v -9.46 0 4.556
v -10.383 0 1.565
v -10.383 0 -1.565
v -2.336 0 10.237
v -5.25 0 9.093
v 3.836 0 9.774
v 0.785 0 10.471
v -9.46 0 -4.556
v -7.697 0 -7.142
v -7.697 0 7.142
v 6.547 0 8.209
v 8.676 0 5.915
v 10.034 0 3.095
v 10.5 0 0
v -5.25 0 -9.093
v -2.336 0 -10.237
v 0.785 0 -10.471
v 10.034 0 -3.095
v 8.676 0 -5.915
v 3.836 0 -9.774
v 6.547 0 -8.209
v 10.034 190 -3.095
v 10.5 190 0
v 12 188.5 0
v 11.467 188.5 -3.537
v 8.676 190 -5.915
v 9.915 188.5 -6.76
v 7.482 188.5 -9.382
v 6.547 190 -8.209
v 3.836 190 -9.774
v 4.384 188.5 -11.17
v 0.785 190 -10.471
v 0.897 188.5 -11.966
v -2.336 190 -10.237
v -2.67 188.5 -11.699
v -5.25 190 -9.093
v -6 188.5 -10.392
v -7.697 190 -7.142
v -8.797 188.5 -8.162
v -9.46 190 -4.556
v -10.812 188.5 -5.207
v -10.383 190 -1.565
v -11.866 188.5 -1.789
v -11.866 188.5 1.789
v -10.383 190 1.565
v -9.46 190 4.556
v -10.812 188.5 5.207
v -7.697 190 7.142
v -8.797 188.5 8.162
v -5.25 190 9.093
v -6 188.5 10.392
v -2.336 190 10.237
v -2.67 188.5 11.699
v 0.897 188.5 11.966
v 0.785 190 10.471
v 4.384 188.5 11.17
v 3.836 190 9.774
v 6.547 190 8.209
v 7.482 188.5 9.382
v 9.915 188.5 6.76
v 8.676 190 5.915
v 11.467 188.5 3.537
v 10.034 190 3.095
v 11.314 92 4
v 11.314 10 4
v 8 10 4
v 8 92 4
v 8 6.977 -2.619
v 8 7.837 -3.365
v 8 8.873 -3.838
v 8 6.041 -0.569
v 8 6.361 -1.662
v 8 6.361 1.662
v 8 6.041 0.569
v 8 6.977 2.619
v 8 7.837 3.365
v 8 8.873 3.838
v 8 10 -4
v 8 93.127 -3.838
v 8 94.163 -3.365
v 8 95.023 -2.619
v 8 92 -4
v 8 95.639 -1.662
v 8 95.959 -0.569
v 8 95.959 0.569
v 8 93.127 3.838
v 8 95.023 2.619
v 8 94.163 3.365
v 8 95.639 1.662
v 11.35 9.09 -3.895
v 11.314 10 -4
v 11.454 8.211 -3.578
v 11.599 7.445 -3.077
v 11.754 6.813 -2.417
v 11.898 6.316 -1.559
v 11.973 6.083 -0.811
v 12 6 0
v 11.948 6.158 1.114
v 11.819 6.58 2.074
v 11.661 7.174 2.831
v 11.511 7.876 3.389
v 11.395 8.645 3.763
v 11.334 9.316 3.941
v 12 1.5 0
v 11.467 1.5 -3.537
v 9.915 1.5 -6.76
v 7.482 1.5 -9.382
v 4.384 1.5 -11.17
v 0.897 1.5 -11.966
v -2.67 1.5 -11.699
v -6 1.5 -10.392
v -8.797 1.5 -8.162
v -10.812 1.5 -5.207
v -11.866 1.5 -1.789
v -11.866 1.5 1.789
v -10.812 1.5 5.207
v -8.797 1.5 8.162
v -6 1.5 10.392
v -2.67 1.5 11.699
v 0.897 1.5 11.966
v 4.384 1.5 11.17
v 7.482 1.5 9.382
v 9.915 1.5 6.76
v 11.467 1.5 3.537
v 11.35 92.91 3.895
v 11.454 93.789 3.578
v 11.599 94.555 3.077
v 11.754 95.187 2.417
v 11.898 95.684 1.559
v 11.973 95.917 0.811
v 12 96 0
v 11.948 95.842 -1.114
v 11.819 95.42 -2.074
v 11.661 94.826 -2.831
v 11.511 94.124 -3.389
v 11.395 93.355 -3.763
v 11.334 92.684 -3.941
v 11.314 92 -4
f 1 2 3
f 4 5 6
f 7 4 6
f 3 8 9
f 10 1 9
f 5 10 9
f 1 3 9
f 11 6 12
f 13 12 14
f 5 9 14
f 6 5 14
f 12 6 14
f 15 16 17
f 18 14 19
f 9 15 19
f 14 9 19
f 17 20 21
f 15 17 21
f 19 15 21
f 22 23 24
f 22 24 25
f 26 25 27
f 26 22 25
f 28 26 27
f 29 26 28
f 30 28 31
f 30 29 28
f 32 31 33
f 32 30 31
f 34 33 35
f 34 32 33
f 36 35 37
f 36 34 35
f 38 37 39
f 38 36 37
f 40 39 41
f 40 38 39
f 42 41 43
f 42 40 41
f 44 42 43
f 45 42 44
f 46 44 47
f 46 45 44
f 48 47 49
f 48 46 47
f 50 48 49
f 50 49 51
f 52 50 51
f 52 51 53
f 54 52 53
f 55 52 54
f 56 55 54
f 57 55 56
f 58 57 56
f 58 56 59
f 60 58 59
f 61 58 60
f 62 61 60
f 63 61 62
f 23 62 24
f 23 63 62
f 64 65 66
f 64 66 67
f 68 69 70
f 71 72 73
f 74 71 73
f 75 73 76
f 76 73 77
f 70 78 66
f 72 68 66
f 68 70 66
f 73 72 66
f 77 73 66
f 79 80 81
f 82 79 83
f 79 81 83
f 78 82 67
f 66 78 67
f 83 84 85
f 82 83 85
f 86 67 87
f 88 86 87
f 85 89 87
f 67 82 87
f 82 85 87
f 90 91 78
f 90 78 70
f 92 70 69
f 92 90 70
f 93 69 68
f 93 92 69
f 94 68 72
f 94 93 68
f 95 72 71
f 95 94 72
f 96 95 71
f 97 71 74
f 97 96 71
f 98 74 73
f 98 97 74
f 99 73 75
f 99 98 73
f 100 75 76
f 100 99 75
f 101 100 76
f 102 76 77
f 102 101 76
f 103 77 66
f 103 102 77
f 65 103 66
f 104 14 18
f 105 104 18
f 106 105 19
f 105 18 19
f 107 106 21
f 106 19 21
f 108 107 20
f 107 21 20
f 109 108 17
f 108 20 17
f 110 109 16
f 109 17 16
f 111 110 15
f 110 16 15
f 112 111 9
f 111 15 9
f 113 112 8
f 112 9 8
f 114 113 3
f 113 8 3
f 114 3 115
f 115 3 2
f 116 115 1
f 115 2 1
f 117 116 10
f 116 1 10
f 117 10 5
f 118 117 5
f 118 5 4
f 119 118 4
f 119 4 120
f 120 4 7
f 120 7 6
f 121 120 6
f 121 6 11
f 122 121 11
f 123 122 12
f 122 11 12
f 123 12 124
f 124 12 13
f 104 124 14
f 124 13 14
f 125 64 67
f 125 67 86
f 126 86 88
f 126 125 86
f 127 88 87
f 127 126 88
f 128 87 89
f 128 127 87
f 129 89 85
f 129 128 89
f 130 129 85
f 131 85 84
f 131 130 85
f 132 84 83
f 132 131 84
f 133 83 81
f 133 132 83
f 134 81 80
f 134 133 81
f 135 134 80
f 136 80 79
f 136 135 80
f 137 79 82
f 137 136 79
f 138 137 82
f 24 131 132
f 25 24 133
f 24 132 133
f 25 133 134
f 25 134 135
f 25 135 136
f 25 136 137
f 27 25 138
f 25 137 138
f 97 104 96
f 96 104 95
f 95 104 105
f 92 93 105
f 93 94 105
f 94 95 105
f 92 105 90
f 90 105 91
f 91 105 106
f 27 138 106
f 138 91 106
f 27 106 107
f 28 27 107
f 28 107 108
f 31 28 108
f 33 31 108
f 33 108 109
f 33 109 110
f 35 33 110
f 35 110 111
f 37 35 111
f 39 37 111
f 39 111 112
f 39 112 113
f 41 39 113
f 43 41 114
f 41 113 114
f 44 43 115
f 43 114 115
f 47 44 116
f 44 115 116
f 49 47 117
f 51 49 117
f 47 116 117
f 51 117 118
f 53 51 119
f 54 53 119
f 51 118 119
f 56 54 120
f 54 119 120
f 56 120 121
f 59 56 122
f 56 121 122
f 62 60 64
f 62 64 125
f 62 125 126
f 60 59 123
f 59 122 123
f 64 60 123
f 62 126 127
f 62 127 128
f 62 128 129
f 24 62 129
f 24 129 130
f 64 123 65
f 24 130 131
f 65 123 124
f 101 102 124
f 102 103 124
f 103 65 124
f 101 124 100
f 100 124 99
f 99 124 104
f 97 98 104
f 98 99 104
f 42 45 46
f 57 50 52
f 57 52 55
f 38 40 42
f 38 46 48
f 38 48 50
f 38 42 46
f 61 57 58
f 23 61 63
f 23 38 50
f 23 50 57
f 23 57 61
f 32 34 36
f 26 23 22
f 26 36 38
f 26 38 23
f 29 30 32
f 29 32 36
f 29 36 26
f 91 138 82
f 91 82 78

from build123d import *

# Parameters (mm, degrees)
SKETCH1_R           = 12
BOSS_EXTRUDE1_DEPTH = 190
CUT_EXTRUDE1_DEPTH  = 4
CHAMFER1_SIZE       = 1.5


with BuildPart() as part:
    # Sketch1 → Boss-Extrude1 (new body)
    with BuildSketch(Plane(origin=(0, 0, 0), x_dir=(1, 0, 0), z_dir=(0, 1, 0))):
        Circle(SKETCH1_R)
    extrude(amount=BOSS_EXTRUDE1_DEPTH)

    # Sketch2 → Cut-Extrude1 (cut)
    with BuildSketch(Plane(origin=(12, 0, 0), x_dir=(0, 0, -1), z_dir=(1, 0, 0))):
        with BuildLine():
            Line((4, 92), (4, 10))
            ThreePointArc((4, 10), (0, 6), (-4, 10))
            Line((-4, 10), (-4, 92))
            ThreePointArc((-4, 92), (0, 96), (4, 92))
        make_face()
    extrude(amount=-CUT_EXTRUDE1_DEPTH, mode=Mode.SUBTRACT)

    # Chamfer1
    chamfer1_edges = [part.edges().sort_by_distance(p)[0] for p in [
        (-12, 0, 0),
        (-12, 190, 0),
    ]]
    chamfer(chamfer1_edges, length=CHAMFER1_SIZE)


solid = part.part
